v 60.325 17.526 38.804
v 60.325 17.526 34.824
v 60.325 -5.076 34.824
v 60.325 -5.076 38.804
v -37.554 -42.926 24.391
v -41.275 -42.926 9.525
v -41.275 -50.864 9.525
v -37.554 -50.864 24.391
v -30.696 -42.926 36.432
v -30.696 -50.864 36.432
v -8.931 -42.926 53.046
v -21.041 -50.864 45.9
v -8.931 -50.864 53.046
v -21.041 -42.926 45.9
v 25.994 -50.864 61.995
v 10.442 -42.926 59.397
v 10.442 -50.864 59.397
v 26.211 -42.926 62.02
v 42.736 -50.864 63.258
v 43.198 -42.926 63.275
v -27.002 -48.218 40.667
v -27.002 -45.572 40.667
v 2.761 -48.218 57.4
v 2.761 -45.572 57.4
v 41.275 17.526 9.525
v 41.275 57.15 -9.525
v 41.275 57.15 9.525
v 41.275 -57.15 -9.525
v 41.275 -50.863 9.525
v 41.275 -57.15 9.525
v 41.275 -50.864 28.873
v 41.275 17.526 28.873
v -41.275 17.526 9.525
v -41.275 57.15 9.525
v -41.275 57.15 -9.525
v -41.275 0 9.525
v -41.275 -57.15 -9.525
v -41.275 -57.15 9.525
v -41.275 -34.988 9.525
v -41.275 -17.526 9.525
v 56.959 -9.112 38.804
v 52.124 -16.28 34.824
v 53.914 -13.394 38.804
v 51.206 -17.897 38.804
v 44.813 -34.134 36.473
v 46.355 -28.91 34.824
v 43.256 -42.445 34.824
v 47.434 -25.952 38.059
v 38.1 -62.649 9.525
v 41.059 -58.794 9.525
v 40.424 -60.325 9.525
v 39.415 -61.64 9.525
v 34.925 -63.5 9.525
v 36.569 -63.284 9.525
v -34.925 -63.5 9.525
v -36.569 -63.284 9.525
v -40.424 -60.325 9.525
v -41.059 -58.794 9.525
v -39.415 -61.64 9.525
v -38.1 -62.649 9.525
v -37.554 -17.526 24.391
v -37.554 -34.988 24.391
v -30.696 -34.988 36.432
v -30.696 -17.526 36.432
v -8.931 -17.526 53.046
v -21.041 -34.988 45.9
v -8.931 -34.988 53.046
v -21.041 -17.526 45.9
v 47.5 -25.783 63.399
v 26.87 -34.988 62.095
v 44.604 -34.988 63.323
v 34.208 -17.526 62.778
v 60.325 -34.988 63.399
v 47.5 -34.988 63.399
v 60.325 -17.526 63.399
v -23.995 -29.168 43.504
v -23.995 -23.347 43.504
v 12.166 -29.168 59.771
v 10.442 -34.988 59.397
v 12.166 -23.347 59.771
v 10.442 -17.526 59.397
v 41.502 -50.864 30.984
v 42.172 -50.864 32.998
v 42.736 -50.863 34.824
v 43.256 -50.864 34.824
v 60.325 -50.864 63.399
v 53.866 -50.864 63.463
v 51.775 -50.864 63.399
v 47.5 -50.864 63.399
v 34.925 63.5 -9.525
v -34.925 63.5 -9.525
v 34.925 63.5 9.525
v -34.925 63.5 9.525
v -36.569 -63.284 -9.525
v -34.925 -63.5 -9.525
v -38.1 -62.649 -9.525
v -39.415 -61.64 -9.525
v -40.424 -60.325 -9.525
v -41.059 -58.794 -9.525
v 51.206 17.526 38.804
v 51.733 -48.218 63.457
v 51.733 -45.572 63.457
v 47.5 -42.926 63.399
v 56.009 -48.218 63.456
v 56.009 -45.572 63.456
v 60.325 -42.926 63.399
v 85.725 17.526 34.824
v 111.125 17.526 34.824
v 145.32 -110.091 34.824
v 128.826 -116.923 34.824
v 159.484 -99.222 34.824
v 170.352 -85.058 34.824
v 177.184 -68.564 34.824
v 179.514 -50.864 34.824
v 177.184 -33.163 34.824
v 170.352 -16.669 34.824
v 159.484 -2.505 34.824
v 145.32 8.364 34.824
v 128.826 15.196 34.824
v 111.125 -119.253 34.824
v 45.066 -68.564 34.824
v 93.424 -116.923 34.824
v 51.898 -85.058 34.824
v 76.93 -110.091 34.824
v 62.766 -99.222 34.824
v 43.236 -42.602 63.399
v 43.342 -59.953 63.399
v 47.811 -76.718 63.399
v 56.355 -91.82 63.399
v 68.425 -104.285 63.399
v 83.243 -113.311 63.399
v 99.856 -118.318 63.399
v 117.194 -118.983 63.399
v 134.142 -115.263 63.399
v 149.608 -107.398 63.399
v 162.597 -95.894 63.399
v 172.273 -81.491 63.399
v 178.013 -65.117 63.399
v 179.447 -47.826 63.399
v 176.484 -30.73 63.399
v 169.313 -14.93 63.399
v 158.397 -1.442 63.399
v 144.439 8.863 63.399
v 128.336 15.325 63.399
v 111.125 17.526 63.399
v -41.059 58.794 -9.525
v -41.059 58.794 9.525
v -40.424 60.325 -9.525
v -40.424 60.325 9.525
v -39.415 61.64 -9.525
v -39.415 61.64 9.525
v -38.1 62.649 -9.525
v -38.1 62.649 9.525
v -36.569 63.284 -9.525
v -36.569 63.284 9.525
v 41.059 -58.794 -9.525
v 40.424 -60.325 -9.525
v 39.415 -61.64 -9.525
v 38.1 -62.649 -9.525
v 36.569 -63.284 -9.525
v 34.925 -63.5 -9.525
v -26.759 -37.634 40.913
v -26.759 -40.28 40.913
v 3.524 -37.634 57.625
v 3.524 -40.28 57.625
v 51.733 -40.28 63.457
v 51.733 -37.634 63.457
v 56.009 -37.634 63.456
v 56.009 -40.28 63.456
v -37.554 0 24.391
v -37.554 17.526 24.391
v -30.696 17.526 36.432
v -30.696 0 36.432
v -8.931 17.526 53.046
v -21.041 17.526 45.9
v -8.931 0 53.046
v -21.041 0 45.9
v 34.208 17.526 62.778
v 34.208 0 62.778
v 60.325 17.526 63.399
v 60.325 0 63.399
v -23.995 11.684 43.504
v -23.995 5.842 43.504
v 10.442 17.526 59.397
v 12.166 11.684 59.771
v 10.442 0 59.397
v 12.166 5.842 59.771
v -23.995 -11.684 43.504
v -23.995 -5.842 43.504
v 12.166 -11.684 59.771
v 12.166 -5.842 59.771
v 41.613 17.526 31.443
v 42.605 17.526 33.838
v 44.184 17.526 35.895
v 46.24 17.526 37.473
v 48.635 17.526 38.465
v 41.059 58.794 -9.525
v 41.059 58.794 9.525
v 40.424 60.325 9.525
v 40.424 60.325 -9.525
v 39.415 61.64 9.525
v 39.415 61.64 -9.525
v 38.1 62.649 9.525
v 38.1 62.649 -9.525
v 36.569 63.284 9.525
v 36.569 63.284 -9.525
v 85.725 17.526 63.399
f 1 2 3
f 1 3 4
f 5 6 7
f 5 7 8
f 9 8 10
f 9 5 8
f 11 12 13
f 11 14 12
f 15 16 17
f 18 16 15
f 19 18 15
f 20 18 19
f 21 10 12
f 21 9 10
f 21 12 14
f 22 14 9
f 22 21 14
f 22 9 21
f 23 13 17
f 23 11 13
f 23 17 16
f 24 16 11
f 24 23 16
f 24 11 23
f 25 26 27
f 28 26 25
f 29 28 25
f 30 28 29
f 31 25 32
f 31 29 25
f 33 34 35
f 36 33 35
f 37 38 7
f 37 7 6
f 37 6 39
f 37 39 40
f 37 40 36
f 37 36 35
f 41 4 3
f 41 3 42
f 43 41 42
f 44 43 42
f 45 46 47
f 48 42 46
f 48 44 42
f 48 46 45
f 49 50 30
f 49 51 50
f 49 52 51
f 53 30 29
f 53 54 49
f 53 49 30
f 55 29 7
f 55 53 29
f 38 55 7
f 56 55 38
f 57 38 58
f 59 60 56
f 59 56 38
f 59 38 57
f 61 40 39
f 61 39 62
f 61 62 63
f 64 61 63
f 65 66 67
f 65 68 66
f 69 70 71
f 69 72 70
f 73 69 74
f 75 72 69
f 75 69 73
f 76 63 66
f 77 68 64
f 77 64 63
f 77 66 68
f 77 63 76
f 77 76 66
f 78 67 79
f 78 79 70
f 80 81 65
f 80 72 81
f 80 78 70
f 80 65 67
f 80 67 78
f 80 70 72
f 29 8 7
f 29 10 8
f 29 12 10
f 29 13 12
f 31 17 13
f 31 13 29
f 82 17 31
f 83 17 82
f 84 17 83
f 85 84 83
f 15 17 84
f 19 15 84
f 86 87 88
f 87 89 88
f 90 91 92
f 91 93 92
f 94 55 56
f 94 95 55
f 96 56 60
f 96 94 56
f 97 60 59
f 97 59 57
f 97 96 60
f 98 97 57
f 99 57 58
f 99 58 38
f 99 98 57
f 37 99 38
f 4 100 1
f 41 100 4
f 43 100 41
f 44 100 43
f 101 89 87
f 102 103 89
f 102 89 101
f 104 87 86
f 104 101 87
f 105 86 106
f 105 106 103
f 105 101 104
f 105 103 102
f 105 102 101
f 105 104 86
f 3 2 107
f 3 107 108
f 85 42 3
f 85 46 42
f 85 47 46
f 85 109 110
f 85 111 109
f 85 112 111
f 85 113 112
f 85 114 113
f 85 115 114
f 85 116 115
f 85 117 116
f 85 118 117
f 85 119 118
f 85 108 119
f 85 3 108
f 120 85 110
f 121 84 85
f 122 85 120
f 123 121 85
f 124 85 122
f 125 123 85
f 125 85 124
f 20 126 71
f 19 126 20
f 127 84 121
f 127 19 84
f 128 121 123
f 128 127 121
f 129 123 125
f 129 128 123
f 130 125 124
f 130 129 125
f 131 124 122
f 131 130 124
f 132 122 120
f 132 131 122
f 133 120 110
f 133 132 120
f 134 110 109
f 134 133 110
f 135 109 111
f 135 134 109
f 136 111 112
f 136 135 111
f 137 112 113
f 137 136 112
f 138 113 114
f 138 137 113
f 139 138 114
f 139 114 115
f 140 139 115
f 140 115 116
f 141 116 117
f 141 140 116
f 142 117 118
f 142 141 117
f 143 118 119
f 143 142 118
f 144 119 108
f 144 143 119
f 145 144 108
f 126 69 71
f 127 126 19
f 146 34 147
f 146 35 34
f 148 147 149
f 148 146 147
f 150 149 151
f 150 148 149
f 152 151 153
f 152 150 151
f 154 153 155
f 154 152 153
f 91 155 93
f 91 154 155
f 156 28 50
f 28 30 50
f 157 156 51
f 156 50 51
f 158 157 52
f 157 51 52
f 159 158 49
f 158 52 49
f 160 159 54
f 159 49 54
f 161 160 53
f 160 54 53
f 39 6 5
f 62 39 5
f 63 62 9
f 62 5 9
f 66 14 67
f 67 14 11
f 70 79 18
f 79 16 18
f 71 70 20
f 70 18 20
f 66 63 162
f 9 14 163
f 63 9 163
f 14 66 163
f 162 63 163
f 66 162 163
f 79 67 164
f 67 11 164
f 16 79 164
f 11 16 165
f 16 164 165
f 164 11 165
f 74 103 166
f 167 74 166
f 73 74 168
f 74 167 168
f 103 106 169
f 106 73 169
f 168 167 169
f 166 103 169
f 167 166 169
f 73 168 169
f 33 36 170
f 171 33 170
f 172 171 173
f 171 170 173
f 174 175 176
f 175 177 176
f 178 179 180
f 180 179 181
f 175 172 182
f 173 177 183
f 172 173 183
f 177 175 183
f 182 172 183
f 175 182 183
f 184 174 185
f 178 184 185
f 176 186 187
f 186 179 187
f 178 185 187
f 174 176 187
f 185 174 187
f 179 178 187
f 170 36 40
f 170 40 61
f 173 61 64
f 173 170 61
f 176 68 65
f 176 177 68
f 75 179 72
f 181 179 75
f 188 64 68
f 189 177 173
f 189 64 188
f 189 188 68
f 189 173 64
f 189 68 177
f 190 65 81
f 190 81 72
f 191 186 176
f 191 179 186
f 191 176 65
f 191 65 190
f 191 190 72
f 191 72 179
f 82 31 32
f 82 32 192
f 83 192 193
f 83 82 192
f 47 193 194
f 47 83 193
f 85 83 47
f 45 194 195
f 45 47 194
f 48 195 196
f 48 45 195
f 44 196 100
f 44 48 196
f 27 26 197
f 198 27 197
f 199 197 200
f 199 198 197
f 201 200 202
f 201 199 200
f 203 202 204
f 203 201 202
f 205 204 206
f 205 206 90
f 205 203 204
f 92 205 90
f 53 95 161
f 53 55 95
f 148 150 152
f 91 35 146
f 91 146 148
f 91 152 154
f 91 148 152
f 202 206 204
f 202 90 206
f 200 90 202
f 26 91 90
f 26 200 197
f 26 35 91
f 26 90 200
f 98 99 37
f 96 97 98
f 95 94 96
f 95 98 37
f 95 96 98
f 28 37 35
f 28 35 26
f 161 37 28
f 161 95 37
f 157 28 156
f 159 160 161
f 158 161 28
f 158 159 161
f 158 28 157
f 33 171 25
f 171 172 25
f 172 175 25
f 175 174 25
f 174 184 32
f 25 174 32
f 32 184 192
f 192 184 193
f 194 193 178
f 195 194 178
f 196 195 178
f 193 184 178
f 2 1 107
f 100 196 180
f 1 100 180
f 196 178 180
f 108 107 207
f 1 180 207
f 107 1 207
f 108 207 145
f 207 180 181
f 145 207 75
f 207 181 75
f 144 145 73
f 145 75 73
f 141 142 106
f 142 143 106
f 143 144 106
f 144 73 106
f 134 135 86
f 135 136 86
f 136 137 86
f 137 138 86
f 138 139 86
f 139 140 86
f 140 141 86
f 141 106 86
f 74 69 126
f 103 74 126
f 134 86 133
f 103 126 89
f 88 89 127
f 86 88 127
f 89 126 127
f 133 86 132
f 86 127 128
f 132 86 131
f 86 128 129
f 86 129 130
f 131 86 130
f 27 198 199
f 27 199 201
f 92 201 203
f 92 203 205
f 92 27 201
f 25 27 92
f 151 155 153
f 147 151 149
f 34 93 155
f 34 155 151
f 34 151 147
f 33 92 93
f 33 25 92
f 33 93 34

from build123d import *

# Parameters (mm, degrees)
F1_DEPTH  = 63.5
F0_W      = 25.4
F0_H      = 5.545384808
F0_H_2    = 19.05
F0_H_3    = 3.979615192
F2_DEPTH  = 17.526
F3_DEPTH  = 25.4
F4_DEPTH  = 7.9375
F4_FACE_W = 68.3895
F4_FACE_H = 28.575
F6_R      = 6.35


with BuildPart() as f1:
    # F0 (on Front) → F1 (new body, symmetric)
    with BuildSketch(Plane.XZ):
        Polygon((-41.275, -9.525), (41.275, -9.525), (41.275, 9.525), (22.225, 9.525), (-41.275, 9.525), align=None)
    extrude(amount=F1_DEPTH, both=True)

    # F0 (on Front) → F2 (join, symmetric)
    with BuildSketch(Plane.XZ):
        Polygon((-41.275, -9.525), (41.275, -9.525), (41.275, 9.525), (22.225, 9.525), (-41.275, 9.525), align=None)
        with BuildLine():
            Line((22.225, 9.525), (41.275, 9.525))
            Line((41.275, 9.525), (41.275, 28.8728918047))
            ThreePointArc((41.275, 28.8728918047), (44.1836383767, 35.8949660218), (51.2057125939, 38.8036043985))
            Line((51.2057125939, 38.8036043985), (60.325, 38.8036043985))
            Line((60.325, 38.8036043985), (60.325, 57.8536043985))
            Line((60.325, 57.8536043985), (51.2057125939, 57.8536043985))
            ThreePointArc((51.2057125939, 57.8536043985), (30.7132541951, 49.3653502034), (22.225, 28.8728918047))
            Line((22.225, 28.8728918047), (22.225, 9.525))
        make_face()
        with BuildLine():
            add(Edge.make_bspline(
                [(-41.275, 9.525), (-35.7294939458, 54.0499053895), (8.4615461528, 64.4009560347), (60.325, 63.3989892066)],
                knots=[0, 0, 0, 0, 114.9998552739, 114.9998552739, 114.9998552739, 114.9998552739], degree=3))
            Line((-41.275, 9.525), (22.225, 9.525))
            Line((22.225, 9.525), (22.225, 28.8728918047))
            ThreePointArc((22.225, 28.8728918047), (30.7132541951, 49.3653502034), (51.2057125939, 57.8536043985))
            Line((51.2057125939, 57.8536043985), (60.325, 57.8536043985))
            Line((60.325, 57.8536043985), (60.325, 63.3989892066))
        make_face()
        with Locations((73.025, 60.6262968025)):
            Rectangle(F0_W, F0_H)
        Polygon((111.125, 63.3989892066), (85.725, 63.3989892066), (85.725, 57.8536043985), (85.725, 38.8036043985), (85.725, 34.8239892066), (111.125, 34.8239892066), align=None)
        with Locations((73.025, 48.3286043985)):
            Rectangle(F0_W, F0_H_2)
        with Locations((73.025, 36.8137968025)):
            Rectangle(F0_W, F0_H_3)
    extrude(amount=F2_DEPTH, both=True)

    # F3 (add, symmetric): a face of the model
    f3_faces = [f1.faces().sort_by_distance(p)[0] for p in [
        (31.3502124895, -17.526, 38.5126856462),
    ]]
    extrude(f3_faces, amount=F3_DEPTH, both=True)

    # F4 (add, symmetric): a face of the model
    f4_faces = [f1.faces().sort_by_distance(p)[0] for p in [
        (31.3502124895, -42.926, 38.5126856462),
    ]]
    extrude(f4_faces, amount=F4_DEPTH, both=True)

    # F4_face (on face) → F5 (revolve)
    with BuildSketch(Plane(origin=(111.125, -16.66875, 49.1114892066), x_dir=(0, 1, 0), z_dir=(1, 0, 0))):
        Rectangle(F4_FACE_W, F4_FACE_H)
    revolve(axis=Axis((111.125, -50.8635, 49.1114892066), (0, 0, 1)))

    # F6
    f6_edges = [f1.edges().sort_by_distance(p)[0] for p in [
        (-41.275, -63.5, 0),
        (41.275, -63.5, 0),
        (41.275, 63.5, 0),
        (-41.275, 63.5, 0),
    ]]
    fillet(f6_edges, radius=F6_R)


solid = f1.part
